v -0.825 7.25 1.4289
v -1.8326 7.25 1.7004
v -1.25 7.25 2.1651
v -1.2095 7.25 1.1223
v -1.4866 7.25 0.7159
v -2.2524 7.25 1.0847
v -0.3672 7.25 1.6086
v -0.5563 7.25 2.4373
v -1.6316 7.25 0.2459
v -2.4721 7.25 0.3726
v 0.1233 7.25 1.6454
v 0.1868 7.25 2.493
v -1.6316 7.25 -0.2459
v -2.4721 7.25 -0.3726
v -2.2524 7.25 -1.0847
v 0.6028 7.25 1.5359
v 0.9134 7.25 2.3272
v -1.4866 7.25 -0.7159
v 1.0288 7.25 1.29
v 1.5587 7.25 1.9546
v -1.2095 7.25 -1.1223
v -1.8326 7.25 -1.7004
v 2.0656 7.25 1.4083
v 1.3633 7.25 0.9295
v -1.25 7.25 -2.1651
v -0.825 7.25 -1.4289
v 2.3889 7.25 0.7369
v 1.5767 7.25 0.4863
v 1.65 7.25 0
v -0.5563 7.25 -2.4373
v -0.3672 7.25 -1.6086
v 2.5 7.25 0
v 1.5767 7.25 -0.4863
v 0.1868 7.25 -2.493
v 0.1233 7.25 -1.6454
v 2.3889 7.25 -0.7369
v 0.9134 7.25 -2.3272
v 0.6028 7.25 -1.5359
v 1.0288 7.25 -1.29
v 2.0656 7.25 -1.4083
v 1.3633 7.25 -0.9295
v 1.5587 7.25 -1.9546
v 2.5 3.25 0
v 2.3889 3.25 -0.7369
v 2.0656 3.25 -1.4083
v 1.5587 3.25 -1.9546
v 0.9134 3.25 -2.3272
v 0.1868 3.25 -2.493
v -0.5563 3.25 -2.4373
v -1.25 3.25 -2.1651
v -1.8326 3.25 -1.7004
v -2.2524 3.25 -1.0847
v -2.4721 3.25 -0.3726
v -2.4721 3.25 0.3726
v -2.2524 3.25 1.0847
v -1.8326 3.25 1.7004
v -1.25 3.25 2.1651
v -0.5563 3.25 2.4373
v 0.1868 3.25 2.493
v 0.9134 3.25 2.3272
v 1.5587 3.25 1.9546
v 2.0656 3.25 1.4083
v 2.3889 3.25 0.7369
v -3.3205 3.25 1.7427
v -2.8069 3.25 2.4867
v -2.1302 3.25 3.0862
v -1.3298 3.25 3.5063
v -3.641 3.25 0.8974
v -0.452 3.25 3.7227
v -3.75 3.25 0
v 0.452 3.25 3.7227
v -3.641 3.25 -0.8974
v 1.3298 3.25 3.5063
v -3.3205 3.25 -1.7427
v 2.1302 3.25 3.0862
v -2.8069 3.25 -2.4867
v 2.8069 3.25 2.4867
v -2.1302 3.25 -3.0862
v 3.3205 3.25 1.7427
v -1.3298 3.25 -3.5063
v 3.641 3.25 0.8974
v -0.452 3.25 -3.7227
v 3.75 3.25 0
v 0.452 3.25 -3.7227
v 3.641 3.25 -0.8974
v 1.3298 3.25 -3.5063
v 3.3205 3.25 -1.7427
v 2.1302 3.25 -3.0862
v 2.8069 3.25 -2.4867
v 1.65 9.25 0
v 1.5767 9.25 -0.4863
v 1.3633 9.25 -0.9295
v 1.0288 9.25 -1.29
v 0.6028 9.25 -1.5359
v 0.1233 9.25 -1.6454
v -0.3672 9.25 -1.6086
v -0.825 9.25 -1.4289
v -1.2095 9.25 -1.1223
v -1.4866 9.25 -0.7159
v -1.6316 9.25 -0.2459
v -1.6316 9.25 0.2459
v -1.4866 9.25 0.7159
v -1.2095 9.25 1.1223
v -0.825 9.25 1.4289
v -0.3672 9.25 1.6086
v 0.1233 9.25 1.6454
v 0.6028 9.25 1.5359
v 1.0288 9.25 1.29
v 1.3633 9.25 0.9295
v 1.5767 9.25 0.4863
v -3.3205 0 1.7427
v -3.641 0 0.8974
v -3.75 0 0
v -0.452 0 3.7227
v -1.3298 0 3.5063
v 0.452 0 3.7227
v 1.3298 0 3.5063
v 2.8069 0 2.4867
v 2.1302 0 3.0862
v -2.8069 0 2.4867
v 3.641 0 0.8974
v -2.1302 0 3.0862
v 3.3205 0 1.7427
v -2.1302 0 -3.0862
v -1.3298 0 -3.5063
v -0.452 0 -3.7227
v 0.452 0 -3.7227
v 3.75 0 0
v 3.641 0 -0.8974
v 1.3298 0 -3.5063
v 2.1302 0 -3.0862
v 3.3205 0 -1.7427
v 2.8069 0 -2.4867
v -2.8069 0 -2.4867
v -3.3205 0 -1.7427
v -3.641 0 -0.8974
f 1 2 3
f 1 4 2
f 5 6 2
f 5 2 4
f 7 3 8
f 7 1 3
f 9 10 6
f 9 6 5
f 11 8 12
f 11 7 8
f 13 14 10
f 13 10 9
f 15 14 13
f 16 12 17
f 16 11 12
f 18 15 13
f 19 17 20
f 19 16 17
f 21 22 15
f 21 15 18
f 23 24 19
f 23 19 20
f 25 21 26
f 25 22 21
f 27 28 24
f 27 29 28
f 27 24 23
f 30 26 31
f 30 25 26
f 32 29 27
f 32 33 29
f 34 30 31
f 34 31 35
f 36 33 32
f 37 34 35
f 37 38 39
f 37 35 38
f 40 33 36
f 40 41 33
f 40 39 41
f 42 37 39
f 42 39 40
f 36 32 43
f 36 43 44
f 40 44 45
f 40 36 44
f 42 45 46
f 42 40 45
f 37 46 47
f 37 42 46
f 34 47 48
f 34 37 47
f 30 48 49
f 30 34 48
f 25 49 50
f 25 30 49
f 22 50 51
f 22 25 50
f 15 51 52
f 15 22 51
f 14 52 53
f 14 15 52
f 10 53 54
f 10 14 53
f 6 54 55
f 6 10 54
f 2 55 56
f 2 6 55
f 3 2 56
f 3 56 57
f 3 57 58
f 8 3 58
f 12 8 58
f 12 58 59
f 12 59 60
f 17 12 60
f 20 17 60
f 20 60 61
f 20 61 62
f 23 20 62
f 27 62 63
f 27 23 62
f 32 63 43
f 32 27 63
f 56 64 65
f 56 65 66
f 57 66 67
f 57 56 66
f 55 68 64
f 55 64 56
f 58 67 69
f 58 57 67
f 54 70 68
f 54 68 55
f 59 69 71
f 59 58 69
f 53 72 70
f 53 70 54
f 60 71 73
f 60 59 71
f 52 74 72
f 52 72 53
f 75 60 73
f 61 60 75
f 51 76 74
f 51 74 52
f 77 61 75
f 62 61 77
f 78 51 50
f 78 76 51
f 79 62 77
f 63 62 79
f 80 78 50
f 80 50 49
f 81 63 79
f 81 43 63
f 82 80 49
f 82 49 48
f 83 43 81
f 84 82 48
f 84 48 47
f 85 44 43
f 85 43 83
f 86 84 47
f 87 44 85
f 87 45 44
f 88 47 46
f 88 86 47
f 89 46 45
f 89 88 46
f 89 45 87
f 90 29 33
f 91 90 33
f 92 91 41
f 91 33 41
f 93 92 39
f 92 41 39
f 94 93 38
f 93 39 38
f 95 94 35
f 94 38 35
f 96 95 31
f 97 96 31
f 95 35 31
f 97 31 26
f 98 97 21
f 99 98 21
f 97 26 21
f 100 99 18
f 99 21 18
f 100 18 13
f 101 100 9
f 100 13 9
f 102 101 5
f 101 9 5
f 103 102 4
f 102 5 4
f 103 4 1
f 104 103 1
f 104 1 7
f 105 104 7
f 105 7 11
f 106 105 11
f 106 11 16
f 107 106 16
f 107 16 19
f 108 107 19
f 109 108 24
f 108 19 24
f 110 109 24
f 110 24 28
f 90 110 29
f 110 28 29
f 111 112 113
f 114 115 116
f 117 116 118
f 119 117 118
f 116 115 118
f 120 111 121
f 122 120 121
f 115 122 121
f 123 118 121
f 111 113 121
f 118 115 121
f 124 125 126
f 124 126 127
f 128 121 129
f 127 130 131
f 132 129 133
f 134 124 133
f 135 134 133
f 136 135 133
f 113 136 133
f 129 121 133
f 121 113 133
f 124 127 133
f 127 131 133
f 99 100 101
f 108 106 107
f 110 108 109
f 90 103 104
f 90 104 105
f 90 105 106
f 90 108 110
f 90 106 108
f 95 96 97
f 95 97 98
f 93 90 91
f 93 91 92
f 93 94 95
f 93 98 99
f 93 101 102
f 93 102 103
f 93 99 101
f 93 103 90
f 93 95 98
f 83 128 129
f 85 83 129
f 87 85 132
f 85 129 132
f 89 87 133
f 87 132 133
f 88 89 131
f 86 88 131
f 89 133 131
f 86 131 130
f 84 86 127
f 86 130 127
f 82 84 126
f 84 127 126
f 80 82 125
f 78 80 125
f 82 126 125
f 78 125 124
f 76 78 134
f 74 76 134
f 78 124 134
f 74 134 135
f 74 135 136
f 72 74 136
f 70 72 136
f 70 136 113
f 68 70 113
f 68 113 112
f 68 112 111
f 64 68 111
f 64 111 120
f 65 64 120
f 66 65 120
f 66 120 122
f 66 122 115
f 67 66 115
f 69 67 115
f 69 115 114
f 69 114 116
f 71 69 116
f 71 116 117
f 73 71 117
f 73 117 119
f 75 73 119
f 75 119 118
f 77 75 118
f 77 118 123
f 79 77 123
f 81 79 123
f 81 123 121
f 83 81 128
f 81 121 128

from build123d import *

# Parameters (mm, degrees)
SKETCH1_R           = 3.75
BOSS_EXTRUDE1_DEPTH = 7.25
SKETCH2_R           = 3.75
SKETCH2_R_2         = 2.5
CUT_EXTRUDE1_DEPTH  = 4
SKETCH3_R           = 1.65
BOSS_EXTRUDE2_DEPTH = 2


with BuildPart() as part:
    # Sketch1 → Boss-Extrude1 (new body)
    with BuildSketch(Plane(origin=(0, 0, 0), x_dir=(1, 0, 0), z_dir=(0, 1, 0))):
        Circle(SKETCH1_R)
    extrude(amount=BOSS_EXTRUDE1_DEPTH)

    # Sketch2 → Cut-Extrude1 (cut)
    with BuildSketch(Plane(origin=(0, 7.25, 0), x_dir=(1, 0, 0), z_dir=(0, 1, 0))):
        Circle(SKETCH2_R)
        Circle(SKETCH2_R_2, mode=Mode.SUBTRACT)
    extrude(amount=-CUT_EXTRUDE1_DEPTH, mode=Mode.SUBTRACT)

    # Sketch3 → Boss-Extrude2 (add)
    with BuildSketch(Plane(origin=(0, 7.25, 0), x_dir=(1, 0, 0), z_dir=(0, 1, 0))):
        Circle(SKETCH3_R)
    extrude(amount=BOSS_EXTRUDE2_DEPTH)


solid = part.part
